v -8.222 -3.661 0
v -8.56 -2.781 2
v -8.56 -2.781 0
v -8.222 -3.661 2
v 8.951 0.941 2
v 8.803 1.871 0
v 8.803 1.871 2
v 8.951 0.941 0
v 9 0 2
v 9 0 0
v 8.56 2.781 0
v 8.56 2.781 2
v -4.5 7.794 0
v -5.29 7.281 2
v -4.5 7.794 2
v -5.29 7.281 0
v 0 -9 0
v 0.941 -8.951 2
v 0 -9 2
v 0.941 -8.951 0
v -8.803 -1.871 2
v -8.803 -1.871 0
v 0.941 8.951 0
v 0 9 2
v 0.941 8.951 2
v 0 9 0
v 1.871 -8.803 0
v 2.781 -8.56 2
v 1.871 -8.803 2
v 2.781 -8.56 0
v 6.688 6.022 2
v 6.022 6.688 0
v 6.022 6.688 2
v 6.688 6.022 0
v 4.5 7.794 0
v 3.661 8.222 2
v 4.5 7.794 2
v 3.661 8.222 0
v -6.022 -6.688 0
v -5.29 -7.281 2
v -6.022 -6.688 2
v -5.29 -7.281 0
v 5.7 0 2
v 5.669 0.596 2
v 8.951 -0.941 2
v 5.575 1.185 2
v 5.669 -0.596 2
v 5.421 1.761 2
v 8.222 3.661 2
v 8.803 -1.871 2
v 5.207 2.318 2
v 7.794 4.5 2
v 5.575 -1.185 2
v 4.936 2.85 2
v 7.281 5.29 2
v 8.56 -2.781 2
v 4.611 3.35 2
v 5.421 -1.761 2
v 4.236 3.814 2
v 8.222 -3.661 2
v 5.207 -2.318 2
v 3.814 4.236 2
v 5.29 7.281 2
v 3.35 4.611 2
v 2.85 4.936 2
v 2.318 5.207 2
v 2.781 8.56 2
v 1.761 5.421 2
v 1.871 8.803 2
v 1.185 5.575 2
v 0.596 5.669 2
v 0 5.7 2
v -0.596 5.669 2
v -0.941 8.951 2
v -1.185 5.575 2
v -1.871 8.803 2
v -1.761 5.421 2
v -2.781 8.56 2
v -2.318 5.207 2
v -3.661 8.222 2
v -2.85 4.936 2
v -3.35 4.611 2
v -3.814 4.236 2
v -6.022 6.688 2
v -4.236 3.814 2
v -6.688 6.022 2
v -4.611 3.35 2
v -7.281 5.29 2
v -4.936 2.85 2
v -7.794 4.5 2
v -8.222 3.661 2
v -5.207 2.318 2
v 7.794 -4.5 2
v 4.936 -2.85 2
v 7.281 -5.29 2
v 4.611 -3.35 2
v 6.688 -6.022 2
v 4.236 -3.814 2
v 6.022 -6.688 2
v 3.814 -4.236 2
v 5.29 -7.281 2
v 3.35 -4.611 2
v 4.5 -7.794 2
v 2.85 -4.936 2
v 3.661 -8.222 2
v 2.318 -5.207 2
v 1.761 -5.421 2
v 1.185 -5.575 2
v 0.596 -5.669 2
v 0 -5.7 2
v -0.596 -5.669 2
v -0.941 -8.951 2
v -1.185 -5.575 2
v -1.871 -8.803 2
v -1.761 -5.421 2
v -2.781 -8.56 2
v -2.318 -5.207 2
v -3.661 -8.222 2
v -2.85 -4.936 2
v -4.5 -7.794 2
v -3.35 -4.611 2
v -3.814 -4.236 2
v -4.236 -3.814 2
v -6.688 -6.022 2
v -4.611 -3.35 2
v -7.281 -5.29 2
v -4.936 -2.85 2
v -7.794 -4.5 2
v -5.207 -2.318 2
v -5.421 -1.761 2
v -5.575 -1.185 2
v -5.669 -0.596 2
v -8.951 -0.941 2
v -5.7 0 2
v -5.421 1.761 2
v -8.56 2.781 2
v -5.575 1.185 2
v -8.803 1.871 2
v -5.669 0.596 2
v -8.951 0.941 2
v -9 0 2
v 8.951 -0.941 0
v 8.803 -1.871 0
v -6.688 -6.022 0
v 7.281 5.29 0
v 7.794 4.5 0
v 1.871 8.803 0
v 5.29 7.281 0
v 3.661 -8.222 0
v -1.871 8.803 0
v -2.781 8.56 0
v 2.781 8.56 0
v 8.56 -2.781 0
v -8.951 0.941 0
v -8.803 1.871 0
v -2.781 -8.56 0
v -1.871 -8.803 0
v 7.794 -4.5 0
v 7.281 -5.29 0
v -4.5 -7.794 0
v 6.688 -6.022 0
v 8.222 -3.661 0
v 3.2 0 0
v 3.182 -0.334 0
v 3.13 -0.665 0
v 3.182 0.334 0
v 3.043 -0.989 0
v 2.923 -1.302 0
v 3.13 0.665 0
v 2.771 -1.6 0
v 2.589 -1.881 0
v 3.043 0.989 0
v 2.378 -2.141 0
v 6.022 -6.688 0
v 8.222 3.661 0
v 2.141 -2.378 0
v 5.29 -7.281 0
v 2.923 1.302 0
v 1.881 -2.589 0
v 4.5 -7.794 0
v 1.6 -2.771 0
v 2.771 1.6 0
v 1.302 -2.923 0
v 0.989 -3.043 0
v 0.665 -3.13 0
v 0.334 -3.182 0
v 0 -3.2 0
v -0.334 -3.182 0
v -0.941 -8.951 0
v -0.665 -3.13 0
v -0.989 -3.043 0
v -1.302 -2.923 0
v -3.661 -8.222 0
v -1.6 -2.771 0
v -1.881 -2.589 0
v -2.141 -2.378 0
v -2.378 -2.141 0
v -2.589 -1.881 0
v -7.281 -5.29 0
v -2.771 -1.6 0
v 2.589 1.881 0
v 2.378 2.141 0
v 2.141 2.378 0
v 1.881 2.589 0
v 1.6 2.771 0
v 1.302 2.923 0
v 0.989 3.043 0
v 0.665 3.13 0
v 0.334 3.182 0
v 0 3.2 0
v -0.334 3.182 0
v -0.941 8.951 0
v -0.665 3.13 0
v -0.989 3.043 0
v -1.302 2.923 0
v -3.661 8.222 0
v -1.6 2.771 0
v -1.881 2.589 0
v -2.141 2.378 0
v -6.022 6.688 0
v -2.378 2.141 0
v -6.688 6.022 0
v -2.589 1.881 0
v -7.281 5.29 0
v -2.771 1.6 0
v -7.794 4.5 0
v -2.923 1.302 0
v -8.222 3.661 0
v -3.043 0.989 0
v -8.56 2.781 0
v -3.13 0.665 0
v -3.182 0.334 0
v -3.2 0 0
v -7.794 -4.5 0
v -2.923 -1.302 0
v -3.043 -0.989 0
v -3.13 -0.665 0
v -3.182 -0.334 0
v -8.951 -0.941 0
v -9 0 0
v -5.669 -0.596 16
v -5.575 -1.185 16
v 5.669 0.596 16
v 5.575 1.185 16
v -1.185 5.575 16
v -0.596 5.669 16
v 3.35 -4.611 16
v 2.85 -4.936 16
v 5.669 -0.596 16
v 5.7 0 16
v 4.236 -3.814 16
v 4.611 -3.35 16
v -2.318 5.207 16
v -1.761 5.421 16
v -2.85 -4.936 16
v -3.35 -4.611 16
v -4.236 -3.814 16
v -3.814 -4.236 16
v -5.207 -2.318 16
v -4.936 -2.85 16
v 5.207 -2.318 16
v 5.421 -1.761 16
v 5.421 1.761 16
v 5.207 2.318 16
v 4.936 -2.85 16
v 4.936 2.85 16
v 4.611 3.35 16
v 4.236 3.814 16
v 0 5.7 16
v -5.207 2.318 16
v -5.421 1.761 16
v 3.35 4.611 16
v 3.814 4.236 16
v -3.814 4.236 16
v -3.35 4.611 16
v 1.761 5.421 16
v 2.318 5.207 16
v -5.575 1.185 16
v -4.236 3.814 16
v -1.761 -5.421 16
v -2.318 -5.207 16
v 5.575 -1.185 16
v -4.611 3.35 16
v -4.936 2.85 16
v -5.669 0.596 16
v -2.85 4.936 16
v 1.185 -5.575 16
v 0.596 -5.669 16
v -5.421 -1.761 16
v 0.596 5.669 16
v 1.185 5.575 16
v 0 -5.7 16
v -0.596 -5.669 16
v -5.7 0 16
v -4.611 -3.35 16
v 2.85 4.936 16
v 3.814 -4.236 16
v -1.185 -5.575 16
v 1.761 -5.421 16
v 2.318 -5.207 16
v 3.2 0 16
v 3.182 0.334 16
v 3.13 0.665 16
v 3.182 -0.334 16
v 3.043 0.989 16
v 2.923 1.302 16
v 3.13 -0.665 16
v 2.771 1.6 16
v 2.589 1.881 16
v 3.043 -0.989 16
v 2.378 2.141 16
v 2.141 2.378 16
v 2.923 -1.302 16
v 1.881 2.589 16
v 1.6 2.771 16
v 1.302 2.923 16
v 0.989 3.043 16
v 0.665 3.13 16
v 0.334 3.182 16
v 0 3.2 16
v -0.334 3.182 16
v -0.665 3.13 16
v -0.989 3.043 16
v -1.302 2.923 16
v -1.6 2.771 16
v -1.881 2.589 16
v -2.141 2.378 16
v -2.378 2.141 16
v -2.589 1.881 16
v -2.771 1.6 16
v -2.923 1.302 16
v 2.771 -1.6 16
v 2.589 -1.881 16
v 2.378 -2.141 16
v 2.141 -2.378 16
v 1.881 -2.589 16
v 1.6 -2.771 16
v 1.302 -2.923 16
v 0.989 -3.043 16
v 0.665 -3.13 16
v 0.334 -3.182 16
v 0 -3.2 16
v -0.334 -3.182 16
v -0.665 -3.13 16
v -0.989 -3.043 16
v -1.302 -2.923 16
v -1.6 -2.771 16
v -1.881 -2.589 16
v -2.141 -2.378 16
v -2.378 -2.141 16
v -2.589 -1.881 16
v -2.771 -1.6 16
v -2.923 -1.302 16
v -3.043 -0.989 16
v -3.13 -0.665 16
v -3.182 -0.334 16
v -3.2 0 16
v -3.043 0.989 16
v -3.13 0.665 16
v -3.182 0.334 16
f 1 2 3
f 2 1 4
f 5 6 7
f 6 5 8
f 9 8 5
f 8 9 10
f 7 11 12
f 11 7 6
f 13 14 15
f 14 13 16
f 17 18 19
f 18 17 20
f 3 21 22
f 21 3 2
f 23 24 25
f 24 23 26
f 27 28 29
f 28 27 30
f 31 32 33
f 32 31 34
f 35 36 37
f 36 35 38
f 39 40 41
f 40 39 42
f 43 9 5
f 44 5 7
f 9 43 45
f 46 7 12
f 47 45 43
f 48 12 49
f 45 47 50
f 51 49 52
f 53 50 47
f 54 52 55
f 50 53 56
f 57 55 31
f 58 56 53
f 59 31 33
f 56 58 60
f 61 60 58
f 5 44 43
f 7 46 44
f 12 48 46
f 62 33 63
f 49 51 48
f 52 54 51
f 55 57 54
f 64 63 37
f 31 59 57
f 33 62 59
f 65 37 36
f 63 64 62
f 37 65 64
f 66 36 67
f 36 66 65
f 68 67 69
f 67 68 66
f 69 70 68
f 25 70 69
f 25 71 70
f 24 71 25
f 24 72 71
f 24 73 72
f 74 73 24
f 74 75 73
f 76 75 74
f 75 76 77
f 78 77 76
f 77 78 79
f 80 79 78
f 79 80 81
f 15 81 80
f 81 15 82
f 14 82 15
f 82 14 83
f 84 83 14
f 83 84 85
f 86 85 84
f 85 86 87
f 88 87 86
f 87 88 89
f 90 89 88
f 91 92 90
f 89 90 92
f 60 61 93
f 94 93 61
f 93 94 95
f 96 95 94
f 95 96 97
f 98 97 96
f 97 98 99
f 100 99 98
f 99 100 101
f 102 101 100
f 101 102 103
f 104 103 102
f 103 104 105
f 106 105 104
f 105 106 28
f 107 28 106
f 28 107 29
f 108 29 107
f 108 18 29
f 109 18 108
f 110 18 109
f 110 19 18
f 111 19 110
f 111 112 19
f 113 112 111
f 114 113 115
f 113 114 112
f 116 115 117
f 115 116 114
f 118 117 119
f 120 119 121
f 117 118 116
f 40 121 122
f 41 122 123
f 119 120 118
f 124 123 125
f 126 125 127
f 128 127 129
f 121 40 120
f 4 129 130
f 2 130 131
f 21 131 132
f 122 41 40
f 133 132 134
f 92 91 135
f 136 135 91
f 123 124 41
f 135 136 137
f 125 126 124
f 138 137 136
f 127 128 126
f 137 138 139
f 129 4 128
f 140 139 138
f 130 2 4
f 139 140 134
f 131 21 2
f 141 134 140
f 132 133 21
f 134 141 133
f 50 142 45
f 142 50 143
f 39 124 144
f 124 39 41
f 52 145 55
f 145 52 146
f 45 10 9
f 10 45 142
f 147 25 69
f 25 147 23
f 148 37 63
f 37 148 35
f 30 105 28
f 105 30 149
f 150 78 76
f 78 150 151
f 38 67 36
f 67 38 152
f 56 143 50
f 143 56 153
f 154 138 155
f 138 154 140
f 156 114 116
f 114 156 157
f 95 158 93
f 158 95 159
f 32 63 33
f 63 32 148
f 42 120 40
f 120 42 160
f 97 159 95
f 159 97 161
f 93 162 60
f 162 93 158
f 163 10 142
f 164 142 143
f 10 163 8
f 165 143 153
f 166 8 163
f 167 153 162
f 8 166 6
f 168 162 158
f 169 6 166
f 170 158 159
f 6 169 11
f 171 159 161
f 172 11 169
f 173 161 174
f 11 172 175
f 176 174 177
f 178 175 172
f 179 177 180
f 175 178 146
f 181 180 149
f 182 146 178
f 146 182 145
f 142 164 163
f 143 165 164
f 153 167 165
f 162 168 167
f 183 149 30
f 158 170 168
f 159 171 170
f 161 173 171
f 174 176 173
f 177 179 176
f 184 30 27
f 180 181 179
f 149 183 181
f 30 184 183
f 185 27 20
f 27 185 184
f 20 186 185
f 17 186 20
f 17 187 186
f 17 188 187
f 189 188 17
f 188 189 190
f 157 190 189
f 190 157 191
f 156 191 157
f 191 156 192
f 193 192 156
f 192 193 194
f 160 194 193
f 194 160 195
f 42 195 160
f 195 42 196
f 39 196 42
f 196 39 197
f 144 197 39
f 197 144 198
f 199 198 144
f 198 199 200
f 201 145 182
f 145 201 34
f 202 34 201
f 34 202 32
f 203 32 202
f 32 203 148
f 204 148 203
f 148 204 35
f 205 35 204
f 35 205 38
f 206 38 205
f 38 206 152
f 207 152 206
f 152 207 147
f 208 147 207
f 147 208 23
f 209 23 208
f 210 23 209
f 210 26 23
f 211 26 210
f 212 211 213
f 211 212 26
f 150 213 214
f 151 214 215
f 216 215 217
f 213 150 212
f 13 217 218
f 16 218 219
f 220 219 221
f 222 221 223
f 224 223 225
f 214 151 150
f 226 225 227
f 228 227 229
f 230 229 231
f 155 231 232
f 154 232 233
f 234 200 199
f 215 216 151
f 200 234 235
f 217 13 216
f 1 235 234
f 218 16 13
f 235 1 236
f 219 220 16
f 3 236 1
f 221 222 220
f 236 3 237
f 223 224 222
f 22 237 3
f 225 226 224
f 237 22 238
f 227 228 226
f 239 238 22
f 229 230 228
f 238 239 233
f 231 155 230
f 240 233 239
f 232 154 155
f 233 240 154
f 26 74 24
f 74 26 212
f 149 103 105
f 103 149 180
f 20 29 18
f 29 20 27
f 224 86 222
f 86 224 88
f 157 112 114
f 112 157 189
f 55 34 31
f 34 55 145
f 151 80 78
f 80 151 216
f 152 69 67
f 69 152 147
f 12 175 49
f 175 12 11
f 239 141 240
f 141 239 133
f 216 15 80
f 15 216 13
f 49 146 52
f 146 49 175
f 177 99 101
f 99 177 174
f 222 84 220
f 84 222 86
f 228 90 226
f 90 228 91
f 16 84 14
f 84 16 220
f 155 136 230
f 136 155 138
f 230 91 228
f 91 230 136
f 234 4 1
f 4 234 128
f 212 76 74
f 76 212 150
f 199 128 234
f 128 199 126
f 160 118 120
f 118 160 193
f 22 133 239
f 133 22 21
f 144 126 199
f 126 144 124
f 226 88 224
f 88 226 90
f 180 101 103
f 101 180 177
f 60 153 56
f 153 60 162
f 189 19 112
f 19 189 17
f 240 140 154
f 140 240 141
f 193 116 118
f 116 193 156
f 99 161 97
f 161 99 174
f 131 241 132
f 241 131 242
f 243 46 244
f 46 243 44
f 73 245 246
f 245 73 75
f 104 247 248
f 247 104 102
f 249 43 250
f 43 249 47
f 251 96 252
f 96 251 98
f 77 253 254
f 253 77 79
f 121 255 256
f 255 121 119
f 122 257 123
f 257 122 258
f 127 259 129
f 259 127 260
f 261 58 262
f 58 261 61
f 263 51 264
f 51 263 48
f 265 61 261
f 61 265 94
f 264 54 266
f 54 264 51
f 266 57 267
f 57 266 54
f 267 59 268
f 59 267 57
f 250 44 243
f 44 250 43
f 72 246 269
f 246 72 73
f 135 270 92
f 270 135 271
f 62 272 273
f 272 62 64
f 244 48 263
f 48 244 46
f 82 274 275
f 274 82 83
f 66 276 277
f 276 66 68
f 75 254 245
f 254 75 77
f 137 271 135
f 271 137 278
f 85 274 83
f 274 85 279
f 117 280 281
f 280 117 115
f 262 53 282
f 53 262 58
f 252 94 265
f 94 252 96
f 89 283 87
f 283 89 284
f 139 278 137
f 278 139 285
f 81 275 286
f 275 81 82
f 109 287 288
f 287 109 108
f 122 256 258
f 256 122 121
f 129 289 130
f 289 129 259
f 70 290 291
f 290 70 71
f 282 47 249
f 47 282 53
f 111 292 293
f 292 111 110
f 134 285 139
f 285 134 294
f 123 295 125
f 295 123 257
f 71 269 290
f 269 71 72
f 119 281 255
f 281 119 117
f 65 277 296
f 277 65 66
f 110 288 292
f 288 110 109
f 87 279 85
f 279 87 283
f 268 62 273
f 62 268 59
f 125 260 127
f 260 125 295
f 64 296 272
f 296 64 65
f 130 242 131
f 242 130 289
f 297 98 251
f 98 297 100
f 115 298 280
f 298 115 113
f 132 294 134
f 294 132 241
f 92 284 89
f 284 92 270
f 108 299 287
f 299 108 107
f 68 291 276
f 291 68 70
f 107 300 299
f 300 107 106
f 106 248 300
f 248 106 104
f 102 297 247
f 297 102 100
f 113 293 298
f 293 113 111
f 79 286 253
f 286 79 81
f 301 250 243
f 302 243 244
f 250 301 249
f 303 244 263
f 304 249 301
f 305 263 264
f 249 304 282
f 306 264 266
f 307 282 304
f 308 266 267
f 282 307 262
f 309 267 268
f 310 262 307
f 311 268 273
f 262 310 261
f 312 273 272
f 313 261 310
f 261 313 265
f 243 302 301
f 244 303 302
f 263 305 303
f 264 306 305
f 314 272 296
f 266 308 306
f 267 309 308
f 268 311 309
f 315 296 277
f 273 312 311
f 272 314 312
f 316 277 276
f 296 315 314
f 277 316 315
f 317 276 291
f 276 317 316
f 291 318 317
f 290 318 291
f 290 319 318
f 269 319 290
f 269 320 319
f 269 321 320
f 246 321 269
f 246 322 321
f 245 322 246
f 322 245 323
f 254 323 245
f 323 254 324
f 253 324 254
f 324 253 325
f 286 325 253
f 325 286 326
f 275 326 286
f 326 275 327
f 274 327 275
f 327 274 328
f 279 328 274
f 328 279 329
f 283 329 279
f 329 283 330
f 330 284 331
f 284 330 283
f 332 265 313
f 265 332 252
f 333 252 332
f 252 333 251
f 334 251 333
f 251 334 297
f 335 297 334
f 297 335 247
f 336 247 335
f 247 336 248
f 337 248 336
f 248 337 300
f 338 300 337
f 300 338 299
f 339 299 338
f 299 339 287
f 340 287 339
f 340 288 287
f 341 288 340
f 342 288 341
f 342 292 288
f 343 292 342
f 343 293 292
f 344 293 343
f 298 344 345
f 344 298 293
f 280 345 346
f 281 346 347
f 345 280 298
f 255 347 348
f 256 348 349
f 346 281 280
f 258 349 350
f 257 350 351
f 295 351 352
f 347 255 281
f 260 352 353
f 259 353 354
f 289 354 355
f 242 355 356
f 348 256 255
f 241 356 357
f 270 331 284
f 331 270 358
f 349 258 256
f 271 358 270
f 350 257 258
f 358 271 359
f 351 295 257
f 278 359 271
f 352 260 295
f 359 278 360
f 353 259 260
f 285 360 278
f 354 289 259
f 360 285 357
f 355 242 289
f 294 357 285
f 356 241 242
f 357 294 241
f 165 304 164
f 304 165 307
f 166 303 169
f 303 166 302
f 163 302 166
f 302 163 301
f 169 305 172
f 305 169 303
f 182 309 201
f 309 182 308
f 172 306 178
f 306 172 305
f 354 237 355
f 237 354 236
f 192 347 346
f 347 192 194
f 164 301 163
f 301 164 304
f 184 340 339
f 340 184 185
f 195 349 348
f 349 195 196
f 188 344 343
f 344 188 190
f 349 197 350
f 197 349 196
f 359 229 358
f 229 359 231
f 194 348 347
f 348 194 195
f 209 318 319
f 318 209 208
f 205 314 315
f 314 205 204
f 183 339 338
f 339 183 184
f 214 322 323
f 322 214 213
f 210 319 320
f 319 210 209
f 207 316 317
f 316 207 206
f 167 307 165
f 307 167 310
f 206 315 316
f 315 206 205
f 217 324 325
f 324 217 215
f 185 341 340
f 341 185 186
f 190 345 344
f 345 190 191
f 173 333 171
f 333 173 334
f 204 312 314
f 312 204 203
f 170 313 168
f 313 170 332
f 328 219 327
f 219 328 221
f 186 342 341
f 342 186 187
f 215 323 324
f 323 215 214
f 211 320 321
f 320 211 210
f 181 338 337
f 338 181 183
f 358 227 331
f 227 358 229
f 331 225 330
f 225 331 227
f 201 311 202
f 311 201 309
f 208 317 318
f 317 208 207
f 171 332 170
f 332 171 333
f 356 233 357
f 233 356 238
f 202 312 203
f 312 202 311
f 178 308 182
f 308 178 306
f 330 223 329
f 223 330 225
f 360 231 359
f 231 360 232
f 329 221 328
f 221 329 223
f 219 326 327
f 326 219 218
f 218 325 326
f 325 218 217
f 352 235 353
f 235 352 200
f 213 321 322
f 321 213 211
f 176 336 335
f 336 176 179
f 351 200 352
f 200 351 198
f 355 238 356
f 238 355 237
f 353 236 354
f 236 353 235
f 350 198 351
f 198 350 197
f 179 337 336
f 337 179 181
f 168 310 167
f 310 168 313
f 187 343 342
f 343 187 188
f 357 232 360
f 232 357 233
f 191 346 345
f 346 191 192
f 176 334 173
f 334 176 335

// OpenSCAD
// Wall-mount standoff with screw flange.
$fn = 60;
eps = 0.02;
thread_d = 6.4;
base_d = 18;
length = 16;
difference() { union() { cylinder(d=base_d,h=2); cylinder(d=thread_d+5,h=length); } translate([0,0,-eps]) cylinder(d=thread_d,h=length+2*eps); }
